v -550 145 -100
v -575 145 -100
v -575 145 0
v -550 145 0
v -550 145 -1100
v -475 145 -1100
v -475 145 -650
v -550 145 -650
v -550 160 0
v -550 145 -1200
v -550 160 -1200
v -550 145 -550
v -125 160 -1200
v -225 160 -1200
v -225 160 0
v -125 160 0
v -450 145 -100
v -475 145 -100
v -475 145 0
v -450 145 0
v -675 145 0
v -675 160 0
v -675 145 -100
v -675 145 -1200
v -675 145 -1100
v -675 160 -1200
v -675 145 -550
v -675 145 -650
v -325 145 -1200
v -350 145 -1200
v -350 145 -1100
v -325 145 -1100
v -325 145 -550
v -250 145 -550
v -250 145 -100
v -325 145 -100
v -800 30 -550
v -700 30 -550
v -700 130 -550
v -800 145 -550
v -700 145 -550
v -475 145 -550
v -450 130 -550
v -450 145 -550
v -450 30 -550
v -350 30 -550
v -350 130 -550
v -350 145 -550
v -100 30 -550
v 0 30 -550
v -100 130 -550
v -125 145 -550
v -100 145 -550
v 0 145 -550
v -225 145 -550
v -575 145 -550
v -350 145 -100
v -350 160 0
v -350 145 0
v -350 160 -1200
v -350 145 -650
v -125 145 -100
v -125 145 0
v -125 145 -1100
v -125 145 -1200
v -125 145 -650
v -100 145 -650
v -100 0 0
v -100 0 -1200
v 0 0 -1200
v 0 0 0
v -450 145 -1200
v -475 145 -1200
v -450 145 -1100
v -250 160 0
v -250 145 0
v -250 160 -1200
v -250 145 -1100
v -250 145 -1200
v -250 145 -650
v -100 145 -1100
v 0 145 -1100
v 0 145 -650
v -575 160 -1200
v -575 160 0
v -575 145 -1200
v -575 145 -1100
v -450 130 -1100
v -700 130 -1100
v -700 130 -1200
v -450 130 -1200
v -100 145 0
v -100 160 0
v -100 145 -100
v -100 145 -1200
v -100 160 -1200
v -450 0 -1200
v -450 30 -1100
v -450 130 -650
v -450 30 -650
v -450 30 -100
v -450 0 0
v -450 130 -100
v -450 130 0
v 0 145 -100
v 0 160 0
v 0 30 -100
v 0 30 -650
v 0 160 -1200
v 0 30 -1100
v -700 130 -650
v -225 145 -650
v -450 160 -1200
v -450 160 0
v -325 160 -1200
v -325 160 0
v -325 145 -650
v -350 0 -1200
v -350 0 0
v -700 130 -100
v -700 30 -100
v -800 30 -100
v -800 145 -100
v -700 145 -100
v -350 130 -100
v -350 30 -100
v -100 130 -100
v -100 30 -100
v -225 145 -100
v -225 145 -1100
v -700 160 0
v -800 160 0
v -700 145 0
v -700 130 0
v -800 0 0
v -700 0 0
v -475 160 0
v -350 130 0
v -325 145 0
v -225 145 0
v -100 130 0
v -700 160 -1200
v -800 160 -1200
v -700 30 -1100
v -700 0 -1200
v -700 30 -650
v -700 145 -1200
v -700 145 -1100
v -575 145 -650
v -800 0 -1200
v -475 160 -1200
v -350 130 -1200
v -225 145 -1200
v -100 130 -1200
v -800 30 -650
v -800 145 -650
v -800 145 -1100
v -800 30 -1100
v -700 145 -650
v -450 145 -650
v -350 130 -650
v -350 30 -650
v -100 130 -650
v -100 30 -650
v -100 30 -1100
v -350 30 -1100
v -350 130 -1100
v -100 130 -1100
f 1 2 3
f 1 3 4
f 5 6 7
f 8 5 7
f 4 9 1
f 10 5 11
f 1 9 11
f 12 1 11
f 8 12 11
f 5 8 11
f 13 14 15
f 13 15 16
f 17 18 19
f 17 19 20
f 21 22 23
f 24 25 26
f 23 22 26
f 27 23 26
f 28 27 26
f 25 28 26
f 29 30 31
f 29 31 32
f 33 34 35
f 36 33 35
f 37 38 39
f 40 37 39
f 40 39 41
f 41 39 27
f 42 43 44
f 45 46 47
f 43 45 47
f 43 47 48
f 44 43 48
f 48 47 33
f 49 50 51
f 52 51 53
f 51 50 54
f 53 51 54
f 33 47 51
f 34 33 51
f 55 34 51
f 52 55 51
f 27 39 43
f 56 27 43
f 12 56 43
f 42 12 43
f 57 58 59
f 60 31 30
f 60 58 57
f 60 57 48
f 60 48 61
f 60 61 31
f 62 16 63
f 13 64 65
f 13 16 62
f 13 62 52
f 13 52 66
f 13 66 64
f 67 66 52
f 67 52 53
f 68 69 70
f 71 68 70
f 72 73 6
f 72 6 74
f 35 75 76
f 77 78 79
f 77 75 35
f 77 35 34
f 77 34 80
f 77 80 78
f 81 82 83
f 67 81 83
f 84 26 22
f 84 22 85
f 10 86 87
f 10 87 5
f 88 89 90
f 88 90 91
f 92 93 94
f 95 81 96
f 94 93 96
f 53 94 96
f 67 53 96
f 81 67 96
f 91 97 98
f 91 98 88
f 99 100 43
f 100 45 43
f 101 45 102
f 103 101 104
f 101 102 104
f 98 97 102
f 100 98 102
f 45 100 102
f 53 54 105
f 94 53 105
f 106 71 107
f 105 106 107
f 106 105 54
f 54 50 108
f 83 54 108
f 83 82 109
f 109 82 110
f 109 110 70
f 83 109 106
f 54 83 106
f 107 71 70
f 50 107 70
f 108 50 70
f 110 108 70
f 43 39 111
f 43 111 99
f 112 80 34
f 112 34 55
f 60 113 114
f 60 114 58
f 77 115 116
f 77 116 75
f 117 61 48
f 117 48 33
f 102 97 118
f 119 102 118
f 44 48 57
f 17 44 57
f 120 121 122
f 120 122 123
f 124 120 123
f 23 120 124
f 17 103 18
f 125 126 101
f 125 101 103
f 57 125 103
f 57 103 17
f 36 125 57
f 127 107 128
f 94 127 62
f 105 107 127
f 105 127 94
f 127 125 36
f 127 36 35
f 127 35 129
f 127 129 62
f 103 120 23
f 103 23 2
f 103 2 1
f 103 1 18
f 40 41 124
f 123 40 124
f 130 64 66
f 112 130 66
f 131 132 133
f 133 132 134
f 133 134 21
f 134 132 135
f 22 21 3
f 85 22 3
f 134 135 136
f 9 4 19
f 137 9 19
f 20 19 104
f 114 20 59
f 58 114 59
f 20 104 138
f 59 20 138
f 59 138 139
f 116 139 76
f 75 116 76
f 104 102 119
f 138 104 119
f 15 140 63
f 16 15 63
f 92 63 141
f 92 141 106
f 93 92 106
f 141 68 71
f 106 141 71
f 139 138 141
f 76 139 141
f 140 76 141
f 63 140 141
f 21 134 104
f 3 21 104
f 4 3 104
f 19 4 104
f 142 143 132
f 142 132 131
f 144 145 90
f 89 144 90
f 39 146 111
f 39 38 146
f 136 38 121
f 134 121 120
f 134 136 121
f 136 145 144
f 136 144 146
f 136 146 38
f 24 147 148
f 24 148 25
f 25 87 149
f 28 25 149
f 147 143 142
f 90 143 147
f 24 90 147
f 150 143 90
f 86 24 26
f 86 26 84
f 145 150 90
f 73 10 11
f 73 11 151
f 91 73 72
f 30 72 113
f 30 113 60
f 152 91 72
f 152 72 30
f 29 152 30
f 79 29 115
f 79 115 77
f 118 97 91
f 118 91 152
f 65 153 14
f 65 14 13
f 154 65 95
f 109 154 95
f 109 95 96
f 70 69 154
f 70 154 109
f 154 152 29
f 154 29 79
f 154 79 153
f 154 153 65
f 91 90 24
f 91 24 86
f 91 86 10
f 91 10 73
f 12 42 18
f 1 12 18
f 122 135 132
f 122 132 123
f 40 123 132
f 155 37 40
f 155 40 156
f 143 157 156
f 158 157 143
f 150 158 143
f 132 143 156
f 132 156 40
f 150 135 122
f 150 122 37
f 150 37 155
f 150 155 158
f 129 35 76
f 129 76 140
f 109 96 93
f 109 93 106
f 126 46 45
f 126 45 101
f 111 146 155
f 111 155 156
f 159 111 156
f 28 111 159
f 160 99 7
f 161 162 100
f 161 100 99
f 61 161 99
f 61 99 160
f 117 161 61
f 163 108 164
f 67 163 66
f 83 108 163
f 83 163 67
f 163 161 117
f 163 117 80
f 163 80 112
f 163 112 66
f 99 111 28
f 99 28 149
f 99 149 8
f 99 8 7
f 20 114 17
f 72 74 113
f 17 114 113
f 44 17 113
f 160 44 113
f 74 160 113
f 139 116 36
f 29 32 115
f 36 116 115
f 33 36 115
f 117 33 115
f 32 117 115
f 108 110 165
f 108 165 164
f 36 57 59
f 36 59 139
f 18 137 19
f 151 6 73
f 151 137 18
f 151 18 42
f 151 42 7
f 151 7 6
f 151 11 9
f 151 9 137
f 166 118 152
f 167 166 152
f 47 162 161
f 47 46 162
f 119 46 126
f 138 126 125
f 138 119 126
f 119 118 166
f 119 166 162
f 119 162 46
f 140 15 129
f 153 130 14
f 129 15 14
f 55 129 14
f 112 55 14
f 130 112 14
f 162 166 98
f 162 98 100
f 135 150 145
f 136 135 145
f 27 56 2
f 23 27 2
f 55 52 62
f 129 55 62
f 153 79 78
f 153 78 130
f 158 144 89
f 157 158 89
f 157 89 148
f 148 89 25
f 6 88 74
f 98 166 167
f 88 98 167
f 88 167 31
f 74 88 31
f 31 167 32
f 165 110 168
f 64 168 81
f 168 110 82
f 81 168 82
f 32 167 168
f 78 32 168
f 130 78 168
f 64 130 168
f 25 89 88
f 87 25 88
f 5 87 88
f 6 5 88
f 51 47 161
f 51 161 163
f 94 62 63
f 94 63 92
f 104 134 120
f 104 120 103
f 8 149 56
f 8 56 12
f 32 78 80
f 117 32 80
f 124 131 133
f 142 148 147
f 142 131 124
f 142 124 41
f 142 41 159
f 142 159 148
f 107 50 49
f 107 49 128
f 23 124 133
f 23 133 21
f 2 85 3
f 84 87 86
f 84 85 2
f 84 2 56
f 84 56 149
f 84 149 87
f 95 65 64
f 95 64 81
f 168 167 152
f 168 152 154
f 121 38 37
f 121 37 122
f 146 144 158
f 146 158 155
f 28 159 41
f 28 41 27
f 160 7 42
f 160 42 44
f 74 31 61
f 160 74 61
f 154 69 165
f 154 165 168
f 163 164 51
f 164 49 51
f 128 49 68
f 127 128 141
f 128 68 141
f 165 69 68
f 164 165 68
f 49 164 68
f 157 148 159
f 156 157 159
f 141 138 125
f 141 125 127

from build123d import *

# Parameters (mm, degrees)
SKETCH1_W              = 800
SKETCH1_H              = 1200
BOSS_EXTRUDE2_DEPTH    = 160
CUT_EXTRUDE2_START     = -800
CUT_EXTRUDE2_OUTLINE_W = 450
CUT_EXTRUDE2_OUTLINE_H = 115
CUT_EXTRUDE2_DEPTH     = 800
SKETCH4_W              = 250
SKETCH4_H              = 130
CUT_EXTRUDE3_DEPTH     = 1452.068571777
SKETCH6_W              = 25
SKETCH6_H              = 1200
CUT_EXTRUDE5_DEPTH     = 15


# Read off the part's stored shape, not the designer's step: Cut-Extrude2
with BuildPart() as part:
    # Sketch1 → Boss-Extrude2 (new body)
    with BuildSketch(Plane(origin=(0, 0, 0), x_dir=(1, 0, 0), z_dir=(0, 1, 0))):
        with Locations((-400, 600)):
            Rectangle(SKETCH1_W, SKETCH1_H)
    extrude(amount=BOSS_EXTRUDE2_DEPTH)

    # Cut-Extrude2 outline → Cut-Extrude2 (cut)
    with BuildSketch(Plane.ZY.offset(800).offset(CUT_EXTRUDE2_START)):
        with Locations((-325, 87.5)):
            Rectangle(CUT_EXTRUDE2_OUTLINE_W, CUT_EXTRUDE2_OUTLINE_H)
        with Locations((-875, 87.5)):
            Rectangle(CUT_EXTRUDE2_OUTLINE_W, CUT_EXTRUDE2_OUTLINE_H)
    extrude(amount=CUT_EXTRUDE2_DEPTH, mode=Mode.SUBTRACT)

    # Sketch4 → Cut-Extrude3 (cut, through all)
    with BuildSketch(Plane.XY):
        with Locations((-575, 65)):
            Rectangle(SKETCH4_W, SKETCH4_H)
        with Locations((-225, 65)):
            Rectangle(SKETCH4_W, SKETCH4_H)
    extrude(amount=-CUT_EXTRUDE3_DEPTH, mode=Mode.SUBTRACT)

    # Sketch6 → Cut-Extrude5 (cut)
    with BuildSketch(Plane(origin=(0, 160, 0), x_dir=(1, 0, 0), z_dir=(0, 1, 0))):
        with Locations((-687.5, 600)):
            Rectangle(SKETCH6_W, SKETCH6_H)
        with Locations((-462.5, 600)):
            Rectangle(SKETCH6_W, SKETCH6_H)
        with Locations((-562.5, 600)):
            Rectangle(SKETCH6_W, SKETCH6_H)
        with Locations((-337.5, 600)):
            Rectangle(SKETCH6_W, SKETCH6_H)
        with Locations((-112.5, 600)):
            Rectangle(SKETCH6_W, SKETCH6_H)
        with Locations((-237.5, 600)):
            Rectangle(SKETCH6_W, SKETCH6_H)
    extrude(amount=-CUT_EXTRUDE5_DEPTH, mode=Mode.SUBTRACT)


solid = part.part
